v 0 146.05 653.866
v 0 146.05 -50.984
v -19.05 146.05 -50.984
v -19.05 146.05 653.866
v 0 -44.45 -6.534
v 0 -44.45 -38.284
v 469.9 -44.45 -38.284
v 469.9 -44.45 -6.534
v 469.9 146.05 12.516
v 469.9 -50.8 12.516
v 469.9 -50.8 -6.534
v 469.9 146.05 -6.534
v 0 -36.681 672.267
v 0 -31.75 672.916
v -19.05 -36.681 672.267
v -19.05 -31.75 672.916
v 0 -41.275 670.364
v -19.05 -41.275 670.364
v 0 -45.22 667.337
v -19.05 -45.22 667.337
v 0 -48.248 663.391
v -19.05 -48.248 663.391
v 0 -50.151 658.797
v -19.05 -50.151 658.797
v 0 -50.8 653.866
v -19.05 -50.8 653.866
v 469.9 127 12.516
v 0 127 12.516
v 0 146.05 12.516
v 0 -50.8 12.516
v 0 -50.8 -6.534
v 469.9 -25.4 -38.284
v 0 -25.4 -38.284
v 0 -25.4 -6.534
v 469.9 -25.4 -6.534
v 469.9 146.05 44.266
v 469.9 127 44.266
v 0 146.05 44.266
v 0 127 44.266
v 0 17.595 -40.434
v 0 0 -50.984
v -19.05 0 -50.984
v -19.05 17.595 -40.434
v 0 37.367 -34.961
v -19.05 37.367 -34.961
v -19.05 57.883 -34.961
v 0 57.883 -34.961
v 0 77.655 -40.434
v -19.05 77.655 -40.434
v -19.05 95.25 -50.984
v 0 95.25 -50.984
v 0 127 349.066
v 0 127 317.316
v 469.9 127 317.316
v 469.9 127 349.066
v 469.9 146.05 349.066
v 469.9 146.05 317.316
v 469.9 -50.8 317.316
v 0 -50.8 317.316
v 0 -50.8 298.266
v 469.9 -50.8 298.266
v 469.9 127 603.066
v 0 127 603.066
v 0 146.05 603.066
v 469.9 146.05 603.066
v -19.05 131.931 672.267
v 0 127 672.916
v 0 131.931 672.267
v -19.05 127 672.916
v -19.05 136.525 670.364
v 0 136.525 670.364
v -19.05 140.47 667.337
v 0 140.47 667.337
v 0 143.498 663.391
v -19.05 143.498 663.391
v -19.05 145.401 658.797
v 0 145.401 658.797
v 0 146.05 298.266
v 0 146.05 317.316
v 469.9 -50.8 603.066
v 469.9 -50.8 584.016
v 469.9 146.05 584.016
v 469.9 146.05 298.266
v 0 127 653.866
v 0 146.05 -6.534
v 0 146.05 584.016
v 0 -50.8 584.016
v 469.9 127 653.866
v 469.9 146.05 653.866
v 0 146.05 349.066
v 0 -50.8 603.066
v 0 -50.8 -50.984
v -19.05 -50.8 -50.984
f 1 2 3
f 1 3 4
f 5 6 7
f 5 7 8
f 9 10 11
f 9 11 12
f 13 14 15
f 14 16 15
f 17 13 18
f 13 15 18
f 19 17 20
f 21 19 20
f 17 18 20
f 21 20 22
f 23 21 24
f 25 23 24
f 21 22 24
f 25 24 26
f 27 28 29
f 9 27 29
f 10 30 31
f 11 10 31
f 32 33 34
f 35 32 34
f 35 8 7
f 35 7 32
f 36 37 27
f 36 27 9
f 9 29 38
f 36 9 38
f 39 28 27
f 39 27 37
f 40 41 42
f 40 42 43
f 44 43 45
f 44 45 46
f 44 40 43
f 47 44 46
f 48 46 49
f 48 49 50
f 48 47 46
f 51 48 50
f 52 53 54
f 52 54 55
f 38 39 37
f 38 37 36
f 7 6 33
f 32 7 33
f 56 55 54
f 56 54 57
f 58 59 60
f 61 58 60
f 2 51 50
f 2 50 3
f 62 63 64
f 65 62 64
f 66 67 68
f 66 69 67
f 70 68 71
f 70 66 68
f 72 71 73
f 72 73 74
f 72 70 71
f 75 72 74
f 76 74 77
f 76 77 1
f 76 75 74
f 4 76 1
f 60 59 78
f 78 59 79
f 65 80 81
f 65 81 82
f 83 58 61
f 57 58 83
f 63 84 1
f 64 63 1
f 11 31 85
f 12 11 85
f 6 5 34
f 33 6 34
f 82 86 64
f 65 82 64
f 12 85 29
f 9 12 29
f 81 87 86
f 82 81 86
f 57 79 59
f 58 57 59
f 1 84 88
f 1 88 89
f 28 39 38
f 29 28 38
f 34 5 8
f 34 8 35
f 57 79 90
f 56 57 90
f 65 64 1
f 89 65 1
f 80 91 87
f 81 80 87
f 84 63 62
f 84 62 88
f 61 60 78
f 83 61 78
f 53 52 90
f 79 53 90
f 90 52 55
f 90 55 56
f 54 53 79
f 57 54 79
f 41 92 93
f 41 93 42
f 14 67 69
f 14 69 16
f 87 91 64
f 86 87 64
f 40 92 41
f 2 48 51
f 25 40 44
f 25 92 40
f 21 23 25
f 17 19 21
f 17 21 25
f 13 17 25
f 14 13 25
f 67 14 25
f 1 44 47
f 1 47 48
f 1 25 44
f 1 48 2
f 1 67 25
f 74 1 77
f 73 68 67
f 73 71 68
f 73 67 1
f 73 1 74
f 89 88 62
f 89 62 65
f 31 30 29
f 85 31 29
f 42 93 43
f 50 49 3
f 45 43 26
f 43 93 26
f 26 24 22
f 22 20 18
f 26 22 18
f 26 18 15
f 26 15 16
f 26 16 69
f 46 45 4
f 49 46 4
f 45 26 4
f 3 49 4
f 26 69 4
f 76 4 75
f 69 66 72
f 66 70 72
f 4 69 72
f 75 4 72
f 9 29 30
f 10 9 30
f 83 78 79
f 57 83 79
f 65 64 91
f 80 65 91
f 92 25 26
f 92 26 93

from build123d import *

# Parameters (mm, degrees)
F0_W     = 19.05
F0_H     = 50.8
F0_H_2   = 31.75
F1_DEPTH = 19.05
F2_DEPTH = 469.9
F3_DEPTH = 469.9
F4_R     = 19.05


with BuildPart() as f1:
    # F0 (on Right) → F1 (new body)
    with BuildSketch(Plane.YZ):
        with Locations((136.525, 628.466184)):
            Rectangle(F0_W, F0_H)
        Polygon((-50.8, 672.916184), (-50.8, 603.066184), (127, 603.066184), (127, 653.866184), (146.05, 653.866184), (146.05, 672.916184), align=None)
        Polygon((-50.8, 603.066184), (-50.8, 584.016184), (146.05, 584.016184), (146.05, 603.066184), (127, 603.066184), align=None)
        Polygon((-50.8, 584.016184), (-50.8, 317.316184), (127, 317.316184), (127, 349.066184), (146.05, 349.066184), (146.05, 584.016184), align=None)
        with Locations((136.525, 333.191184)):
            Rectangle(F0_W, F0_H_2)
        Polygon((-50.8, 298.266184), (146.05, 298.266184), (146.05, 317.316184), (127, 317.316184), (-50.8, 317.316184), align=None)
        Polygon((127, 44.266184), (146.05, 44.266184), (146.05, 298.266184), (-50.8, 298.266184), (-50.8, 12.516184), (127, 12.516184), align=None)
        with Locations((136.525, 28.391184)):
            Rectangle(F0_W, F0_H_2)
        with BuildLine():
            ThreePointArc((0, -50.983816), (47.625, -34.267422), (95.25, -50.983816))
            Line((95.25, -50.983816), (146.05, -50.983816))
            Line((146.05, -50.983816), (146.05, -6.533816))
            Line((146.05, -6.533816), (-25.4, -6.533816))
            Line((-25.4, -6.533816), (-25.4, -38.283816))
            Line((-25.4, -38.283816), (-44.45, -38.283816))
            Line((-44.45, -38.283816), (-44.45, -6.533816))
            Line((-44.45, -6.533816), (-50.8, -6.533816))
            Line((-50.8, -6.533816), (-50.8, -50.983816))
            Line((-50.8, -50.983816), (0, -50.983816))
        make_face()
        with Locations((-34.925, -22.408816)):
            Rectangle(F0_W, F0_H_2)
        Polygon((-25.4, -6.533816), (146.05, -6.533816), (146.05, 12.516184), (127, 12.516184), (-50.8, 12.516184), (-50.8, -6.533816), (-44.45, -6.533816), align=None)
    extrude(amount=-F1_DEPTH)

    # F4
    f4_edges = [f1.edges().sort_by_distance(p)[0] for p in [
        (-9.525, 146.05, 672.916184),
        (-9.525, -50.8, 672.916184),
    ]]
    fillet(f4_edges, radius=F4_R)


with BuildPart() as f2:
    # F0 (on Right) → F2 (new body)
    with BuildSketch(Plane.YZ):
        with Locations((136.525, 628.466184)):
            Rectangle(F0_W, F0_H)
        with Locations((136.525, 333.191184)):
            Rectangle(F0_W, F0_H_2)
        with Locations((136.525, 28.391184)):
            Rectangle(F0_W, F0_H_2)
        with Locations((-34.925, -22.408816)):
            Rectangle(F0_W, F0_H_2)
    extrude(amount=F2_DEPTH)


with BuildPart() as f3:
    # F0 (on Right) → F3 (new body)
    with BuildSketch(Plane.YZ):
        Polygon((-50.8, 603.066184), (-50.8, 584.016184), (146.05, 584.016184), (146.05, 603.066184), (127, 603.066184), align=None)
        Polygon((-50.8, 298.266184), (146.05, 298.266184), (146.05, 317.316184), (127, 317.316184), (-50.8, 317.316184), align=None)
        Polygon((-25.4, -6.533816), (146.05, -6.533816), (146.05, 12.516184), (127, 12.516184), (-50.8, 12.516184), (-50.8, -6.533816), (-44.45, -6.533816), align=None)
    extrude(amount=F3_DEPTH)


solid = Compound([f1.part, f2.part, f3.part])
